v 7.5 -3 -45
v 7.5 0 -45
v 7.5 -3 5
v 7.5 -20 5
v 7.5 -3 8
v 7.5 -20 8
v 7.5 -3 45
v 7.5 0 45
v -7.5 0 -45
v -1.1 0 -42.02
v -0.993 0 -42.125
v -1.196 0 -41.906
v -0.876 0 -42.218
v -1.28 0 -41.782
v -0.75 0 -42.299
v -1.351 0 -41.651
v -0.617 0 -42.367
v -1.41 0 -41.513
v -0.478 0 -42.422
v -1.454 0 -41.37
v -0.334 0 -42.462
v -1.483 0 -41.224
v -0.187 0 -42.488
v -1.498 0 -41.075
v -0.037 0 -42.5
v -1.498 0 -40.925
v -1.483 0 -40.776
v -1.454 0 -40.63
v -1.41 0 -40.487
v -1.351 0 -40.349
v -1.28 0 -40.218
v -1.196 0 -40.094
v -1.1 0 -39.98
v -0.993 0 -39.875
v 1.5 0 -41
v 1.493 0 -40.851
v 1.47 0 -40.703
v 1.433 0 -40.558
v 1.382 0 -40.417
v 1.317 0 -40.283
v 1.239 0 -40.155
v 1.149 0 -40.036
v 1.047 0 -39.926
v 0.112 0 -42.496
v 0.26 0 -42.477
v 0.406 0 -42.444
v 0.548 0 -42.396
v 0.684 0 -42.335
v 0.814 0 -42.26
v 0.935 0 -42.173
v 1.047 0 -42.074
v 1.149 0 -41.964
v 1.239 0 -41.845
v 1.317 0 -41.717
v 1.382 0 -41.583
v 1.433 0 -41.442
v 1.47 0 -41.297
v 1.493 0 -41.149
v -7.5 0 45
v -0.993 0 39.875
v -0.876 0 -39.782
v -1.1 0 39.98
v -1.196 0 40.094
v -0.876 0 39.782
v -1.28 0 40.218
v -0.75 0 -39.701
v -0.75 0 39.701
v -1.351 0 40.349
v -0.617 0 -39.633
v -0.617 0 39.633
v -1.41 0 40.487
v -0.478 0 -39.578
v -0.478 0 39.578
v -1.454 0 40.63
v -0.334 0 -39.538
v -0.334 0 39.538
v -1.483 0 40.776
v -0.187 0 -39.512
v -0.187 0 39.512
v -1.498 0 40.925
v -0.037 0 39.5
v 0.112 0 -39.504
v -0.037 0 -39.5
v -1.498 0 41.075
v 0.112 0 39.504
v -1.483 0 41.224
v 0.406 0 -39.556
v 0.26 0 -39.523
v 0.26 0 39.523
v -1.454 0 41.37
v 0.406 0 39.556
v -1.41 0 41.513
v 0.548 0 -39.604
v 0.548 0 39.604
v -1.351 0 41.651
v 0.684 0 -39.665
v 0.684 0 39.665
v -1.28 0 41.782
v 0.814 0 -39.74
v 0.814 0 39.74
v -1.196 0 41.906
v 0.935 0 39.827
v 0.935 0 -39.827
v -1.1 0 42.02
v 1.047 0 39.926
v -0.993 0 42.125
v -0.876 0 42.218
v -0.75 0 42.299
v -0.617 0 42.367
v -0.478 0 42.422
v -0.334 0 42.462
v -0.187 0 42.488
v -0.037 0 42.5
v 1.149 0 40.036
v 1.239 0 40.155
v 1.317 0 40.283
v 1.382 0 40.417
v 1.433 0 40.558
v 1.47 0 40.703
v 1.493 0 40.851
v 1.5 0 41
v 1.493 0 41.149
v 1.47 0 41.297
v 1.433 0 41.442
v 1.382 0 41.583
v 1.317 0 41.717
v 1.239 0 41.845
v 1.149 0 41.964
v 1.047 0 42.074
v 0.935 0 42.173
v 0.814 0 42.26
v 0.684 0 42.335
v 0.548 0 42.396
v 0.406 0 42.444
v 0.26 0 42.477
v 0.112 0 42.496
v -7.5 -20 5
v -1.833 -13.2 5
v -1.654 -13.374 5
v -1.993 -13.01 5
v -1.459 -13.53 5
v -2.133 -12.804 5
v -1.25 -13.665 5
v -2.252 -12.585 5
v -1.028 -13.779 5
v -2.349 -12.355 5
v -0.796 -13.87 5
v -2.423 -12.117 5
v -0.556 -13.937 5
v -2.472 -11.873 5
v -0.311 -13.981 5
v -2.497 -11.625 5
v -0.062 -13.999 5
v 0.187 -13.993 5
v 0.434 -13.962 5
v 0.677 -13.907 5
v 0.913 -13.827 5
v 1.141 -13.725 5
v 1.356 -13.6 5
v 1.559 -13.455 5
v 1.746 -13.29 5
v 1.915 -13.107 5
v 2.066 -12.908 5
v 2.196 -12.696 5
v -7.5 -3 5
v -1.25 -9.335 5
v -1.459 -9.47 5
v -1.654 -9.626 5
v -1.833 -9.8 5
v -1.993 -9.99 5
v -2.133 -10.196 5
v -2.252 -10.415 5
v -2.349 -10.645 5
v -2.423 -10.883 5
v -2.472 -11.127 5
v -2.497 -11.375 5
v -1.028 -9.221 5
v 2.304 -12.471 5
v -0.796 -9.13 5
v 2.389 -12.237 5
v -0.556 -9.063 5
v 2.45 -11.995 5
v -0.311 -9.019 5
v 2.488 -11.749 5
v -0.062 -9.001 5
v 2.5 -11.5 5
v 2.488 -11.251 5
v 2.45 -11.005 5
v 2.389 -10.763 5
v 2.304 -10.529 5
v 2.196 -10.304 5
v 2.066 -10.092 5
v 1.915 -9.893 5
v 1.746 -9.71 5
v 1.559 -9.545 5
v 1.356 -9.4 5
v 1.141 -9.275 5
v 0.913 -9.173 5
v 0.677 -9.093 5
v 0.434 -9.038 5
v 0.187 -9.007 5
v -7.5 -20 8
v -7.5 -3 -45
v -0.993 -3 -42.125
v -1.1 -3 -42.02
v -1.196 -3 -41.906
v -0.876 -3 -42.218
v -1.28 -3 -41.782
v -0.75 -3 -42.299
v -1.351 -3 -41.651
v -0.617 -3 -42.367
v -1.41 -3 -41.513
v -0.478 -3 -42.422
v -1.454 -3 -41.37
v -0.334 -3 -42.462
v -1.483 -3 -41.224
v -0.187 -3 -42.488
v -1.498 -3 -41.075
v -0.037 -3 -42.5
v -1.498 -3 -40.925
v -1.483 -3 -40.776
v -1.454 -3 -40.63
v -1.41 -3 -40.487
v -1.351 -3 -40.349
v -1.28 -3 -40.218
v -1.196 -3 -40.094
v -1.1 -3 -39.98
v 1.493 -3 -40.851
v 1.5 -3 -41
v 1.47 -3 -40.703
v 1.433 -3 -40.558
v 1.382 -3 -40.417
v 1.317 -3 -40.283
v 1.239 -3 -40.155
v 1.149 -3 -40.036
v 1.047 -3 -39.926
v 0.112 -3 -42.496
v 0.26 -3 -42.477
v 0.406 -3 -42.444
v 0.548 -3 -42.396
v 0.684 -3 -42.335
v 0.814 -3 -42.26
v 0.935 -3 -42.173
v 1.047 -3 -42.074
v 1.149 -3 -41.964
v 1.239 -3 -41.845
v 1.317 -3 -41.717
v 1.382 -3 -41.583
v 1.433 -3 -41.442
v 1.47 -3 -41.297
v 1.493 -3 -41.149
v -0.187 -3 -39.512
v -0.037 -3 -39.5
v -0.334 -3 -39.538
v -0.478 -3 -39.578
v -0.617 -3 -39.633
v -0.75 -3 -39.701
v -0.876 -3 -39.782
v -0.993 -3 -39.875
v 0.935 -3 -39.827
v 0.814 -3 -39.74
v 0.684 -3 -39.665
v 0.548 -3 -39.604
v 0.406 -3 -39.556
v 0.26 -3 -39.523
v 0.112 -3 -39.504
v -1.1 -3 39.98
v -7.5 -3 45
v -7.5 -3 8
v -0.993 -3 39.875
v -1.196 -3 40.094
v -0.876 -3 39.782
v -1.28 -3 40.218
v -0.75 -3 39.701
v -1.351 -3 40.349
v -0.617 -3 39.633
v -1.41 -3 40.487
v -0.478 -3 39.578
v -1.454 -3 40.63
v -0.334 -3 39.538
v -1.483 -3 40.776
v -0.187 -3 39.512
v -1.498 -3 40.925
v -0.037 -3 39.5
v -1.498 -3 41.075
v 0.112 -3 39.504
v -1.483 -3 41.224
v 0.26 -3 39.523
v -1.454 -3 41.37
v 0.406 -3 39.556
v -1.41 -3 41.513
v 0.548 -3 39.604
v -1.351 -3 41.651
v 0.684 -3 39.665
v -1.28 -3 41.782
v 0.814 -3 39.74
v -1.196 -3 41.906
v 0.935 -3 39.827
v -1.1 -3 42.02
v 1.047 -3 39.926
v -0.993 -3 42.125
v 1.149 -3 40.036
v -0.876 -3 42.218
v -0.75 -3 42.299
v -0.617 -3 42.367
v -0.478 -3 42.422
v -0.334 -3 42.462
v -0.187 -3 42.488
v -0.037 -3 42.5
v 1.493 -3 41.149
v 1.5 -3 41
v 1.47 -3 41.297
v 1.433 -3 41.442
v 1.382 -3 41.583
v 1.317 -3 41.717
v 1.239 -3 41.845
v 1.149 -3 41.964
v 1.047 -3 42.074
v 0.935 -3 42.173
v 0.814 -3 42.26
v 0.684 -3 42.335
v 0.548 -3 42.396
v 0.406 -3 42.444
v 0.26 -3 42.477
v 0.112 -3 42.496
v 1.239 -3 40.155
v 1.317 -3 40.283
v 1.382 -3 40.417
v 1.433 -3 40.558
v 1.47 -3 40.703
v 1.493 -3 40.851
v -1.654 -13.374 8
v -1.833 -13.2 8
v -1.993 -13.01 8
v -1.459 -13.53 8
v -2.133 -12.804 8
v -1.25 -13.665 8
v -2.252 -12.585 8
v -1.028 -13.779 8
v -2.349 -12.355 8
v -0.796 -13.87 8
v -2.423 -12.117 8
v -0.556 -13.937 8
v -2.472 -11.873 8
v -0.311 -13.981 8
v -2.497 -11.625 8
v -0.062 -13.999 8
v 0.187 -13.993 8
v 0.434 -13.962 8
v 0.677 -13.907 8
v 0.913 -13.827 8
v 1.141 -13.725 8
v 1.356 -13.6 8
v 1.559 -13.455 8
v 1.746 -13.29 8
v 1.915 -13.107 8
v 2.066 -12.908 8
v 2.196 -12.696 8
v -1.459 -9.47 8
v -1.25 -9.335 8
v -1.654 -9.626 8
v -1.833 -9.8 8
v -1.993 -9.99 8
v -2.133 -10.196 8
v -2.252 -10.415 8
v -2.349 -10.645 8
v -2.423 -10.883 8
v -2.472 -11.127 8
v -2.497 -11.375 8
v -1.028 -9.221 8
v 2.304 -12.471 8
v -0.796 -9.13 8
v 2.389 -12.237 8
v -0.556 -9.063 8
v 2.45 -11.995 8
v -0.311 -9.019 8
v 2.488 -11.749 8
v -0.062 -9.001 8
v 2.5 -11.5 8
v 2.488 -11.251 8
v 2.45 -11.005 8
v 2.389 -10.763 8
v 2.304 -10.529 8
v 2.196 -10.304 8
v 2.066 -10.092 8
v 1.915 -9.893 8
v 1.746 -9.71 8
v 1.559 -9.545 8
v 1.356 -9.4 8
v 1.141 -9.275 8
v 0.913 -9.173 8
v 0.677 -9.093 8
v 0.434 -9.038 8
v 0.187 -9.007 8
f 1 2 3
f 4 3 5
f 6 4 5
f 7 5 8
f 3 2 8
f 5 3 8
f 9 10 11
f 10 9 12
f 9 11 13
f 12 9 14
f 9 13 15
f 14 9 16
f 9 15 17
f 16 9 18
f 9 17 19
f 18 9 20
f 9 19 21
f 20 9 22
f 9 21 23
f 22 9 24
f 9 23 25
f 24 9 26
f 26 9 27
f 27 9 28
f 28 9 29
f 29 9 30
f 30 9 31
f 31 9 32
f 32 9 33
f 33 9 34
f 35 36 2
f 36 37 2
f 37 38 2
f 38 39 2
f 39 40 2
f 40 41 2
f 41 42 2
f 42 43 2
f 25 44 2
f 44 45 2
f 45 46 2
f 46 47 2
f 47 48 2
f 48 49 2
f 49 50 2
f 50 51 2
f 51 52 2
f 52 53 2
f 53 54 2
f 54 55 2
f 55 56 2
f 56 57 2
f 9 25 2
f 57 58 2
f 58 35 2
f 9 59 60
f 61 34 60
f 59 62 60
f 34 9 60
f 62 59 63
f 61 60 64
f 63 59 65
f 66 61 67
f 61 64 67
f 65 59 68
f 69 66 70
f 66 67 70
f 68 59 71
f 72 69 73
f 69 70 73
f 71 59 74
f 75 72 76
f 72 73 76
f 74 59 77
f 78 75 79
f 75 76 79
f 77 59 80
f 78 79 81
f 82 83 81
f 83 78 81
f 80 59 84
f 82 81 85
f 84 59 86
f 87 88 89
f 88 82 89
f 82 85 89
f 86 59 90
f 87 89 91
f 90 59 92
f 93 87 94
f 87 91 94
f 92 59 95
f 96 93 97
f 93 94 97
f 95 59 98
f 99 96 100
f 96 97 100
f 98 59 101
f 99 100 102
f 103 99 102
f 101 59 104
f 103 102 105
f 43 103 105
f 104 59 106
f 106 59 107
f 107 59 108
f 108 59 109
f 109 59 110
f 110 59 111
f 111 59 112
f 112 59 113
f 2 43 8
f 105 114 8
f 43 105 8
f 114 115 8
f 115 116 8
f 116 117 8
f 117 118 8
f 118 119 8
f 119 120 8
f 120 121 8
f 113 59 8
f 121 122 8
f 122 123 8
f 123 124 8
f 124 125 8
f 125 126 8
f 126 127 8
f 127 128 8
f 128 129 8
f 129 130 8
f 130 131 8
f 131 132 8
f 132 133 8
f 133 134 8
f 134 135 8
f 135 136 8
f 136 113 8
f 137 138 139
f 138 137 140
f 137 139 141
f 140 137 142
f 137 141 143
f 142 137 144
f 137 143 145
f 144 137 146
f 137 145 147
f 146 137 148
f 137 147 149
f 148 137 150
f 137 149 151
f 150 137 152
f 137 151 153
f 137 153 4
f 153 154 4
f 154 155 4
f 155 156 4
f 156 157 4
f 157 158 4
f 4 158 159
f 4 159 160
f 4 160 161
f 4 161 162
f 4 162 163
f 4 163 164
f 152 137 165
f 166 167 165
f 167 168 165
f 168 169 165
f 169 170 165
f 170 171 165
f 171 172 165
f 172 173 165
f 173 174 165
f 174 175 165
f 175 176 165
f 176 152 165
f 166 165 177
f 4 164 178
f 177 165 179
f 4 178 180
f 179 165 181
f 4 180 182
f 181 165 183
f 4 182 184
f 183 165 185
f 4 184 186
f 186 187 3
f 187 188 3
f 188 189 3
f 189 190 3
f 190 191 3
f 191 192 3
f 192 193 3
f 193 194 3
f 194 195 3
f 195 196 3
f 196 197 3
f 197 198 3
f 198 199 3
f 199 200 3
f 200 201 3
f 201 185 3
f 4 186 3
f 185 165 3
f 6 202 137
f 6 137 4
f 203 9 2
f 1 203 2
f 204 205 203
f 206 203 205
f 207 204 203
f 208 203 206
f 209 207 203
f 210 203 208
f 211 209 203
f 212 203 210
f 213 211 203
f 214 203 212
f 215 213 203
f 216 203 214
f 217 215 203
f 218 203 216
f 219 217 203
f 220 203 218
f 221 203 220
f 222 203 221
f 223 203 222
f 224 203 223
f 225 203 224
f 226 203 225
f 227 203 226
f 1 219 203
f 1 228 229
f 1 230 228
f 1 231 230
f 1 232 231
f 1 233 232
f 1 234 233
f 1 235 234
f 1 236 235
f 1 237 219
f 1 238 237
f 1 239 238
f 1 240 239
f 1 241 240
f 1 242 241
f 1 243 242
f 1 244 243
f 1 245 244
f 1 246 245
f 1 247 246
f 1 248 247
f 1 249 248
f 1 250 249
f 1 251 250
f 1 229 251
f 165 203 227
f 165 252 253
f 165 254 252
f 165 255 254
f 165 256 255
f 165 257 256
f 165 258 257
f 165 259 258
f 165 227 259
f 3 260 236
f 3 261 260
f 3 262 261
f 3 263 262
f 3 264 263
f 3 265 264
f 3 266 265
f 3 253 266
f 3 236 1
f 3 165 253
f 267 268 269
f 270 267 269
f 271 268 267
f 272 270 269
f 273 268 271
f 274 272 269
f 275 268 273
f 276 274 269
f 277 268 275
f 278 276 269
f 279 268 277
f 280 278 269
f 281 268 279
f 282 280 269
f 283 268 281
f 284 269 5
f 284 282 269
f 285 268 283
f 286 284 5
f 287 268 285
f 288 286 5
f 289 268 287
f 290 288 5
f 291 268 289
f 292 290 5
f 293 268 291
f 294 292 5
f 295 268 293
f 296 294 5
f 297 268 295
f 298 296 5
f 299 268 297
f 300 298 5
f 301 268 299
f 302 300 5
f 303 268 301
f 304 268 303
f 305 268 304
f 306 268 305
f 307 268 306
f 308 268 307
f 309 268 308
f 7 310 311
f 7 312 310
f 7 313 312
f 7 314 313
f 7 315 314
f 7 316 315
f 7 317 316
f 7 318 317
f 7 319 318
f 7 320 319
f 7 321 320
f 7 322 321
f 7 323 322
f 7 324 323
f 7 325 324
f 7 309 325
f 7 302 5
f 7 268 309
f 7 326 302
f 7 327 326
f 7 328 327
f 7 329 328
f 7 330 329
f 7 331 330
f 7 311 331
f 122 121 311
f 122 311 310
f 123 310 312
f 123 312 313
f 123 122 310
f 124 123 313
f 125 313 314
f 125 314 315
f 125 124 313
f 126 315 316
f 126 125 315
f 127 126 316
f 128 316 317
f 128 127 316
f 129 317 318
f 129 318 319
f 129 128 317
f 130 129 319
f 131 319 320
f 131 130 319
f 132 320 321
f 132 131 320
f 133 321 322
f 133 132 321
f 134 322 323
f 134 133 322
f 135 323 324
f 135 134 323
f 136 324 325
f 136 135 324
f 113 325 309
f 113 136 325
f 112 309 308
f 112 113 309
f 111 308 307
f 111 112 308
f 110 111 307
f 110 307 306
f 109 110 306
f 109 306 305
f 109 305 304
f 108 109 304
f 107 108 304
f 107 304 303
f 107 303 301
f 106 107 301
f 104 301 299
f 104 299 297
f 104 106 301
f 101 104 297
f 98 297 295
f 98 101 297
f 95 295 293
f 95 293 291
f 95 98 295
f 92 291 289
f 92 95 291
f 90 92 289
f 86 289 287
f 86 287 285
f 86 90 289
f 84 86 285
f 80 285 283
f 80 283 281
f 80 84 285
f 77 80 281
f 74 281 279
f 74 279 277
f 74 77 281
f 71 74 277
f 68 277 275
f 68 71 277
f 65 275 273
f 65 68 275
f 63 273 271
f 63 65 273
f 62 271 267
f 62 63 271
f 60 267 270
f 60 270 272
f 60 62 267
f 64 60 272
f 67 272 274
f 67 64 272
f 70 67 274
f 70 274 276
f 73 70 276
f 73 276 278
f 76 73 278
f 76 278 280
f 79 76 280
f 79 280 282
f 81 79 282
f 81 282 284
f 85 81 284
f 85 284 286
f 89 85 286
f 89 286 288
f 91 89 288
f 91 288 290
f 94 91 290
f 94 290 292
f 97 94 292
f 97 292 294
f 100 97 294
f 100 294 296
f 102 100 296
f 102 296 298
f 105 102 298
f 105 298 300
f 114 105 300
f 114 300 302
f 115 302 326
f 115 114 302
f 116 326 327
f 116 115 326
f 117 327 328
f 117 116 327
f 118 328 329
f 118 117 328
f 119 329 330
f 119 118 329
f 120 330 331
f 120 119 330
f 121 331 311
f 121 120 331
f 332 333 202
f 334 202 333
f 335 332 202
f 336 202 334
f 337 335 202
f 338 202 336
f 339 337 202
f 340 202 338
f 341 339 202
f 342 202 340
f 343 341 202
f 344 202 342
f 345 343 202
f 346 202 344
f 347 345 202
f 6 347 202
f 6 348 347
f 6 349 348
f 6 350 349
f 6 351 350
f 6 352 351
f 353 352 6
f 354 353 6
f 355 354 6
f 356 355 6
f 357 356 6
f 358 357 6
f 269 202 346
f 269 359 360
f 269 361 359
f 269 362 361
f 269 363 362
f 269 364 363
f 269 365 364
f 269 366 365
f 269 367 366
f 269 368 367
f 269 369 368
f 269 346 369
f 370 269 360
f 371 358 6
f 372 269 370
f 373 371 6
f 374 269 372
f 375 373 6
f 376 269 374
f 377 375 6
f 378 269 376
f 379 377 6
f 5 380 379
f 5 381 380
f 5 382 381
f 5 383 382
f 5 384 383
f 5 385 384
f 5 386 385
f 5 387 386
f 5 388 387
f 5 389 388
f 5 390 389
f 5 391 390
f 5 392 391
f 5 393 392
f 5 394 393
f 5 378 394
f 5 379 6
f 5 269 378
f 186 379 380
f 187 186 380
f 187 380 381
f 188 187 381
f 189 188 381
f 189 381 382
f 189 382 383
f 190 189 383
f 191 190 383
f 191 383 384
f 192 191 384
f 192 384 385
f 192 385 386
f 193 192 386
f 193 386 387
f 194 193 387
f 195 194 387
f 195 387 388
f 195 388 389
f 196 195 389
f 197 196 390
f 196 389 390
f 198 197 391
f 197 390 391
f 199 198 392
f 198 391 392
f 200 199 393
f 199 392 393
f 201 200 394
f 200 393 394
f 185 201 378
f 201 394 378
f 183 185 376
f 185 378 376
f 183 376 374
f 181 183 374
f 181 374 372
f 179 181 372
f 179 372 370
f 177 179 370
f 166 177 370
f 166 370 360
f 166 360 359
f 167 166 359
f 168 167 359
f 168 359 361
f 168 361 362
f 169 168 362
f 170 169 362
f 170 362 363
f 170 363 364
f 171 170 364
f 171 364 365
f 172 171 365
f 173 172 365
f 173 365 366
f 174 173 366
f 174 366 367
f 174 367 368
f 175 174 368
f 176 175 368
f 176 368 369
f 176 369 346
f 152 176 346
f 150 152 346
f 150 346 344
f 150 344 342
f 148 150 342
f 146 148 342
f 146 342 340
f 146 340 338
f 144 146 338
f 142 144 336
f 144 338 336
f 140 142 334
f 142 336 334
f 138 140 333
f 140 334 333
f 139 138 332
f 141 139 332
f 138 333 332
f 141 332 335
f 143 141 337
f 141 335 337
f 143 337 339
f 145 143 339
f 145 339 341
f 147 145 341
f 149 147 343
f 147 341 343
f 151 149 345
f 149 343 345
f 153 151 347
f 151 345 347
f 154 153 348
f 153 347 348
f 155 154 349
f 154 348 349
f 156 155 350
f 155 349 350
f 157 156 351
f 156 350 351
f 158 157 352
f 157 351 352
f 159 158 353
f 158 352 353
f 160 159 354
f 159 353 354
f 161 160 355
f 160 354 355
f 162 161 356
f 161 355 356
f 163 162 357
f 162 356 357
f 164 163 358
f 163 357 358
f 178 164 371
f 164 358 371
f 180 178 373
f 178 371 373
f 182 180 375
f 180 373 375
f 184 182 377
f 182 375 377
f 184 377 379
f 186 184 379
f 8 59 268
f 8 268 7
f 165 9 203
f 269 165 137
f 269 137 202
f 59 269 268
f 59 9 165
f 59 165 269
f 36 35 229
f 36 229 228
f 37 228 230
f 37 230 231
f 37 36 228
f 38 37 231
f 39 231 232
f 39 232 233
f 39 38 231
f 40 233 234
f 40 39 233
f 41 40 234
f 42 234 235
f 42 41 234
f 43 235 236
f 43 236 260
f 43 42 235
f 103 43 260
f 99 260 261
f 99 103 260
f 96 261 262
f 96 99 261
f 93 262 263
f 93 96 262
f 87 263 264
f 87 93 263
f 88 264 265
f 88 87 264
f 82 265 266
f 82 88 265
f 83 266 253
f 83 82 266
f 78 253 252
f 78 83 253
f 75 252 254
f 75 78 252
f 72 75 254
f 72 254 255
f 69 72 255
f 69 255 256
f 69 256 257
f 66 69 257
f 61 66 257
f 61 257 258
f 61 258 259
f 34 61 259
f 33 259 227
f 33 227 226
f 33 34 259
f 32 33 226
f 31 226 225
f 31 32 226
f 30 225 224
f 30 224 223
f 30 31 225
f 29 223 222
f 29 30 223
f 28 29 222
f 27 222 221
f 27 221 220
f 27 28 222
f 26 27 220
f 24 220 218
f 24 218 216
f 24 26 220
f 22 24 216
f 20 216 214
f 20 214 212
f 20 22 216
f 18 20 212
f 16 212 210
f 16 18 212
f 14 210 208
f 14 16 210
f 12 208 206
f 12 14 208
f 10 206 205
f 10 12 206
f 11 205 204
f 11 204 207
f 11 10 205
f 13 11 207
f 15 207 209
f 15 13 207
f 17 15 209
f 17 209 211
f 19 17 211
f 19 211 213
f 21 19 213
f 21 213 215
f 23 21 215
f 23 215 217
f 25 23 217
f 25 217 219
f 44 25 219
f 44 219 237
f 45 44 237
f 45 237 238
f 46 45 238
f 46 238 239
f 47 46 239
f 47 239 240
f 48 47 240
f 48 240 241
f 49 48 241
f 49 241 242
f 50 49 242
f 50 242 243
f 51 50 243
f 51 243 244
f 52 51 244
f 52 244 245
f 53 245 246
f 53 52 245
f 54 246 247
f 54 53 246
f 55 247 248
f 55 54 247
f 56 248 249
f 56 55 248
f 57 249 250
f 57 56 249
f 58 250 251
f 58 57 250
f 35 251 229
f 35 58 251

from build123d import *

# Parameters (mm, degrees)
F0_W     = 15
F0_H     = 90
F0_R     = 1.5
F1_DEPTH = 3
F2_W     = 15
F2_H     = 3
F3_DEPTH = 17
F4_R     = 2.5
F5_DEPTH = 53.001


with BuildPart() as f1:
    # F0 (on Front) → F1 (new body)
    with BuildSketch(Plane.XZ):
        Rectangle(F0_W, F0_H)
        with Locations((0, -41)):
            Circle(F0_R, mode=Mode.SUBTRACT)
        with Locations((0, 41)):
            Circle(F0_R, mode=Mode.SUBTRACT)
    extrude(amount=F1_DEPTH)

    # F2 (on face) → F3 (join)
    with BuildSketch(Plane.XZ.offset(3)):
        with Locations((0, 6.5)):
            Rectangle(F2_W, F2_H)
    extrude(amount=F3_DEPTH)

    # F4 (on face) → F5 (cut, through all)
    with BuildSketch(Plane.XY.offset(8)):
        with Locations((0, -11.5)):
            Circle(F4_R)
    extrude(amount=-F5_DEPTH, mode=Mode.SUBTRACT)


solid = f1.part
